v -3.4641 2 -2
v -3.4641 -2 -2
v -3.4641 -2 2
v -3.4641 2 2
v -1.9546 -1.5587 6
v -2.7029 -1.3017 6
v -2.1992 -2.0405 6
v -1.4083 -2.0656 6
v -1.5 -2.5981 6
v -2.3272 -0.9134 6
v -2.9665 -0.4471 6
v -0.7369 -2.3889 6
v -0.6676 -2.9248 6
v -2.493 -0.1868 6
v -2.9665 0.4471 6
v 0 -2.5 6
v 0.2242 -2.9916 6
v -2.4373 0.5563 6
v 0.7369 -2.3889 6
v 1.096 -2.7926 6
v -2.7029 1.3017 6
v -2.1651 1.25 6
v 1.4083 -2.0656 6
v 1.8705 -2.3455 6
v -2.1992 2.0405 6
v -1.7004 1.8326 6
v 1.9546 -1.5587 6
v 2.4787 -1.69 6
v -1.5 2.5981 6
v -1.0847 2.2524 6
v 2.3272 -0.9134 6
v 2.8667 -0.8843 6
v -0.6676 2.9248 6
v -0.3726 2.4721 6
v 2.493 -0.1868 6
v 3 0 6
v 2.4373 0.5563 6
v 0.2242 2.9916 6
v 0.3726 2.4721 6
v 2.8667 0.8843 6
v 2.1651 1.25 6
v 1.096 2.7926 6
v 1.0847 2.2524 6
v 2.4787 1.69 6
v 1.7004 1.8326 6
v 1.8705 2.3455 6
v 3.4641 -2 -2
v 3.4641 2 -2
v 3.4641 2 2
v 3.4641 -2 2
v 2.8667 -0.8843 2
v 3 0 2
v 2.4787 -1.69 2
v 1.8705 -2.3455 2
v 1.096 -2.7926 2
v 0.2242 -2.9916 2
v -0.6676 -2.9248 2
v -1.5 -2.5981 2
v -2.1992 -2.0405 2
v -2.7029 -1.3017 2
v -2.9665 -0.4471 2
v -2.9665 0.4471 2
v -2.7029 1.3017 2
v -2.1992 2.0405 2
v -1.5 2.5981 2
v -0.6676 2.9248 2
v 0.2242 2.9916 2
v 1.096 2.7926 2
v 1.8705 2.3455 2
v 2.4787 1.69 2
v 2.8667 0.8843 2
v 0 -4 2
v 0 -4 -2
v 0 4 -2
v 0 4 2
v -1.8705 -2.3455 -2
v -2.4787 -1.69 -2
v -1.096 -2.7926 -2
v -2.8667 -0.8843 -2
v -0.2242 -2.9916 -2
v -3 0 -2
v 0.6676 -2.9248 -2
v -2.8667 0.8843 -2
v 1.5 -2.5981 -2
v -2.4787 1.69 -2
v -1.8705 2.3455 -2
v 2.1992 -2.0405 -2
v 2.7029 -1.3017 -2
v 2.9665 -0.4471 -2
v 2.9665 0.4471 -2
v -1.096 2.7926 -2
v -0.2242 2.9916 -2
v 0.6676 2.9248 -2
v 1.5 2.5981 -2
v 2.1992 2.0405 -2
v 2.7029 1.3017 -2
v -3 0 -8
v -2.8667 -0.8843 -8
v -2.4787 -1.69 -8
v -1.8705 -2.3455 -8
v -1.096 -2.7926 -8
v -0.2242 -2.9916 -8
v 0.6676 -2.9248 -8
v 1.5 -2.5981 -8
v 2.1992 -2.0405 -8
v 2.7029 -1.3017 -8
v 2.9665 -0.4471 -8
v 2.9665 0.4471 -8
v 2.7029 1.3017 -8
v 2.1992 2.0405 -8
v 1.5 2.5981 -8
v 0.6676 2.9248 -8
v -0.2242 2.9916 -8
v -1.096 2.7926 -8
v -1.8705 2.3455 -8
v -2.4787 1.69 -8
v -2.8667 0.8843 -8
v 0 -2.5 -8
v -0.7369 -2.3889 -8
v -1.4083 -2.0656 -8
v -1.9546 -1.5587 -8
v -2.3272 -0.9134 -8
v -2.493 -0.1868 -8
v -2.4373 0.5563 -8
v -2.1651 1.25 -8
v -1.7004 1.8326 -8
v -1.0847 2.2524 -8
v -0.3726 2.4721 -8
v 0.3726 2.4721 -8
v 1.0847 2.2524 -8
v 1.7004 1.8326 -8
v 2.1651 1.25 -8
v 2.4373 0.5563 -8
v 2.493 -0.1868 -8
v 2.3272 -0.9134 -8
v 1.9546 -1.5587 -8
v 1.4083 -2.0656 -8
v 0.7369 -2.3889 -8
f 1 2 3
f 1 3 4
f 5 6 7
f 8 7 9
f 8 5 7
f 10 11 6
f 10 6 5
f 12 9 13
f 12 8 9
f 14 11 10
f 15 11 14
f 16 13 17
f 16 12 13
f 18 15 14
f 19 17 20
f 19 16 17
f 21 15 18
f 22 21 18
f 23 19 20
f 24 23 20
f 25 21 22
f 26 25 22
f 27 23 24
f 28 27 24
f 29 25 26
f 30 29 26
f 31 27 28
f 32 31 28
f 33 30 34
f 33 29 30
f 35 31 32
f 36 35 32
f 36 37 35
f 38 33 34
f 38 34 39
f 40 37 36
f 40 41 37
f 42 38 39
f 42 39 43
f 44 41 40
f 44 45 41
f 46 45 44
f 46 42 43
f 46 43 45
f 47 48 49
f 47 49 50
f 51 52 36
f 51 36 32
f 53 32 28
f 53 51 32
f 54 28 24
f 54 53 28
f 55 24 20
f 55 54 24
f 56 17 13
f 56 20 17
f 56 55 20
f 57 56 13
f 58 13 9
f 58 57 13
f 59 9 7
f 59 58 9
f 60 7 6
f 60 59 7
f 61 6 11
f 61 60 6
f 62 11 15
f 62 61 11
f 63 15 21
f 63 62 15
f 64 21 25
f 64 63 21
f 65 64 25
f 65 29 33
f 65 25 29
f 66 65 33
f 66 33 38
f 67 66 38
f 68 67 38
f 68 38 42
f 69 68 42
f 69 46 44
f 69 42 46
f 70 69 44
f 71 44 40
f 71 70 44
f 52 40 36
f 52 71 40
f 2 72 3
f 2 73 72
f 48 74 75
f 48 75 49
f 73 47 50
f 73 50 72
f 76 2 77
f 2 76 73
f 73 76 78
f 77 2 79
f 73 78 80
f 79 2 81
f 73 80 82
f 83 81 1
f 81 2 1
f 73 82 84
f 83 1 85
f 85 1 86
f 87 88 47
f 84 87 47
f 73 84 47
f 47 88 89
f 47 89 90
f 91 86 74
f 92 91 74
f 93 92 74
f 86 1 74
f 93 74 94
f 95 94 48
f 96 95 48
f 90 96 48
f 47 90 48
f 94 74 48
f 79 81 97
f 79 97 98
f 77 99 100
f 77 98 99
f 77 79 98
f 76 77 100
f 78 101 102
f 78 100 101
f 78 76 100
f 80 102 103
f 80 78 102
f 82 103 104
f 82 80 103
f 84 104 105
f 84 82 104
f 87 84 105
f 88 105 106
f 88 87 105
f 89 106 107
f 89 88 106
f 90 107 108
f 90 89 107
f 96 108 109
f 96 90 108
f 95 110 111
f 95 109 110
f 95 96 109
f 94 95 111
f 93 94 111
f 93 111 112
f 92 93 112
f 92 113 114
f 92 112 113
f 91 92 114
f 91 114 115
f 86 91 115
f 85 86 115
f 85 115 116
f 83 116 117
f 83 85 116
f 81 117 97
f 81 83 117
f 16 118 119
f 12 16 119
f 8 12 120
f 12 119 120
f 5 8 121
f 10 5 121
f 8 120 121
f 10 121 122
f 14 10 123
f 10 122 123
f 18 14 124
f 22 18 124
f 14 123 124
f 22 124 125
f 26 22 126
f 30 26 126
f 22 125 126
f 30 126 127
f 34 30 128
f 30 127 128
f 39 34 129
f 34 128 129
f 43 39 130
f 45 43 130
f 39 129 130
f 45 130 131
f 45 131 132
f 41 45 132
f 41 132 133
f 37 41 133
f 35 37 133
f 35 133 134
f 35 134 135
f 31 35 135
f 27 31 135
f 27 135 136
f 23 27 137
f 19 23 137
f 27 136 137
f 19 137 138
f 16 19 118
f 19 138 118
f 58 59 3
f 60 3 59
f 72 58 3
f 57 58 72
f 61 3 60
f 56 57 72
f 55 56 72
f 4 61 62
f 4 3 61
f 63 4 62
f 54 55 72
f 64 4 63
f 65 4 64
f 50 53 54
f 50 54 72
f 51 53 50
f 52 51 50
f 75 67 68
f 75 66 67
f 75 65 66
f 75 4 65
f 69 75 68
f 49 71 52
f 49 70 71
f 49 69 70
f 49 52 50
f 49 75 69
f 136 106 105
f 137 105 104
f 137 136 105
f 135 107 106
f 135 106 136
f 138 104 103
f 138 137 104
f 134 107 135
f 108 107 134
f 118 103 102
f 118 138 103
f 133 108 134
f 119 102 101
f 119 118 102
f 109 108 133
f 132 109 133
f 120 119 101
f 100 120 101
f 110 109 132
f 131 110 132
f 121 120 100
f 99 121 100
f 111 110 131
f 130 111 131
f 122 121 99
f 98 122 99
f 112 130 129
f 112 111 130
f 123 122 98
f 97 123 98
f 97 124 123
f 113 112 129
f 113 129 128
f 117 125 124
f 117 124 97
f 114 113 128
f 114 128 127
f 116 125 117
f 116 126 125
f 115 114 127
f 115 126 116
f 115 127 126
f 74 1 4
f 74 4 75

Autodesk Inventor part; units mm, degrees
ref_plane "YZ Plane" through (0, 0, 0) normal (1, 0, 0) x (0, 1, 0)
ref_plane "XZ Plane" through (0, 0, 0) normal (0, 1, 0) x (-1, 0, 0)
ref_plane "XY Plane" through (0, 0, 0) normal (0, 0, 1) x (1, 0, 0)
sketch "Sketch2" plane through (0, 0, 0) normal (0, 0, 1) x (1, 0, 0)
  line L0 (0, 4) -> (3.4641, 2)
  line L1 (3.4641, 2) -> (3.4641, -2)
  line L2 (3.4641, -2) -> (0, -4)
  line L3 (0, -4) -> (-3.4641, -2)
  line L4 (-3.4641, -2) -> (-3.4641, 2)
  line L5 (-3.4641, 2) -> (0, 4)
  point P0 (0, 0)
  point P1 (0, 0)
  point P2 (-3.4641, 0)
  dimension "d0" = 8
extrude "Extrusion1" add sketch "Sketch2" along normal mid plane 4
sketch "Sketch3" plane through (0, 0, 2) normal (0, 0, 1) x (1, 0, 0)
  circle A0 centre (0, 0) radius 3
  dimension "d3" = 6
extrude "Extrusion2" add sketch "Sketch3" along normal blind 4
sketch "Sketch4" plane through (0, 0, -2) normal (0, 0, -1) x (-1, 0, 0)
  circle A0 centre (0, 0) radius 3
  dimension "d6" = 6
extrude "Extrusion3" add sketch "Sketch4" along normal blind 6
sketch "Sketch5" plane through (0, 0, 6) normal (0, 0, 1) x (1, 0, 0)
  circle A0 centre (0, 0) radius 3 projected
hole "Hole1" at (0, 0, 6) direction (0, 0, -1) diameter 5 depth 14
thread "Thread1" size "M6x1" class "6g" standard "ISO Metric profile" length 35.9
properties part number "25.1"
